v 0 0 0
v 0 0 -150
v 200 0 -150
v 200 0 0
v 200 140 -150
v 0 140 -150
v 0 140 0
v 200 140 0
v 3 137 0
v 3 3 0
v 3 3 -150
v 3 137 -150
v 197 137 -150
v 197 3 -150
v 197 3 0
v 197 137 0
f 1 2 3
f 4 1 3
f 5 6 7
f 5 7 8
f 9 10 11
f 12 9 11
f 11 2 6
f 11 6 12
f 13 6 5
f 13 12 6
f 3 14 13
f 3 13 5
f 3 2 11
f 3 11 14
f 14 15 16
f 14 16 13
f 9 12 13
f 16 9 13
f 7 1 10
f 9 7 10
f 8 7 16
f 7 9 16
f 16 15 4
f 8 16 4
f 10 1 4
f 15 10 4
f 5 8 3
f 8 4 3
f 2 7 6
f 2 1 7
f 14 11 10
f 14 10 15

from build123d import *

# Parameters (mm, degrees)
CROQUIS1_W              = 200
CROQUIS1_H              = 150
SALIENTE_EXTRUIR1_DEPTH = 3
CROQUIS2_W              = 3
CROQUIS2_H              = 150
SALIENTE_EXTRUIR2_DEPTH = 134
CROQUIS3_W              = 200
CROQUIS3_H              = 150
SALIENTE_EXTRUIR3_DEPTH = 3


with BuildPart() as part:
    # Croquis1 → Saliente-Extruir1 (new body)
    with BuildSketch(Plane(origin=(0, 0, 0), x_dir=(1, 0, 0), z_dir=(0, 1, 0))):
        with Locations((100, 75)):
            Rectangle(CROQUIS1_W, CROQUIS1_H)
    extrude(amount=SALIENTE_EXTRUIR1_DEPTH)

    # Croquis2 → Saliente-Extruir2 (add)
    with BuildSketch(Plane(origin=(0, 3, 0), x_dir=(1, 0, 0), z_dir=(0, 1, 0))):
        with Locations((1.5, 75)):
            Rectangle(CROQUIS2_W, CROQUIS2_H)
        with Locations((198.5, 75)):
            Rectangle(CROQUIS2_W, CROQUIS2_H)
    extrude(amount=SALIENTE_EXTRUIR2_DEPTH)

    # Croquis3 → Saliente-Extruir3 (add)
    with BuildSketch(Plane(origin=(0, 137, 0), x_dir=(1, 0, 0), z_dir=(0, 1, 0))):
        with Locations((100, 75)):
            Rectangle(CROQUIS3_W, CROQUIS3_H)
    extrude(amount=SALIENTE_EXTRUIR3_DEPTH)


solid = part.part
